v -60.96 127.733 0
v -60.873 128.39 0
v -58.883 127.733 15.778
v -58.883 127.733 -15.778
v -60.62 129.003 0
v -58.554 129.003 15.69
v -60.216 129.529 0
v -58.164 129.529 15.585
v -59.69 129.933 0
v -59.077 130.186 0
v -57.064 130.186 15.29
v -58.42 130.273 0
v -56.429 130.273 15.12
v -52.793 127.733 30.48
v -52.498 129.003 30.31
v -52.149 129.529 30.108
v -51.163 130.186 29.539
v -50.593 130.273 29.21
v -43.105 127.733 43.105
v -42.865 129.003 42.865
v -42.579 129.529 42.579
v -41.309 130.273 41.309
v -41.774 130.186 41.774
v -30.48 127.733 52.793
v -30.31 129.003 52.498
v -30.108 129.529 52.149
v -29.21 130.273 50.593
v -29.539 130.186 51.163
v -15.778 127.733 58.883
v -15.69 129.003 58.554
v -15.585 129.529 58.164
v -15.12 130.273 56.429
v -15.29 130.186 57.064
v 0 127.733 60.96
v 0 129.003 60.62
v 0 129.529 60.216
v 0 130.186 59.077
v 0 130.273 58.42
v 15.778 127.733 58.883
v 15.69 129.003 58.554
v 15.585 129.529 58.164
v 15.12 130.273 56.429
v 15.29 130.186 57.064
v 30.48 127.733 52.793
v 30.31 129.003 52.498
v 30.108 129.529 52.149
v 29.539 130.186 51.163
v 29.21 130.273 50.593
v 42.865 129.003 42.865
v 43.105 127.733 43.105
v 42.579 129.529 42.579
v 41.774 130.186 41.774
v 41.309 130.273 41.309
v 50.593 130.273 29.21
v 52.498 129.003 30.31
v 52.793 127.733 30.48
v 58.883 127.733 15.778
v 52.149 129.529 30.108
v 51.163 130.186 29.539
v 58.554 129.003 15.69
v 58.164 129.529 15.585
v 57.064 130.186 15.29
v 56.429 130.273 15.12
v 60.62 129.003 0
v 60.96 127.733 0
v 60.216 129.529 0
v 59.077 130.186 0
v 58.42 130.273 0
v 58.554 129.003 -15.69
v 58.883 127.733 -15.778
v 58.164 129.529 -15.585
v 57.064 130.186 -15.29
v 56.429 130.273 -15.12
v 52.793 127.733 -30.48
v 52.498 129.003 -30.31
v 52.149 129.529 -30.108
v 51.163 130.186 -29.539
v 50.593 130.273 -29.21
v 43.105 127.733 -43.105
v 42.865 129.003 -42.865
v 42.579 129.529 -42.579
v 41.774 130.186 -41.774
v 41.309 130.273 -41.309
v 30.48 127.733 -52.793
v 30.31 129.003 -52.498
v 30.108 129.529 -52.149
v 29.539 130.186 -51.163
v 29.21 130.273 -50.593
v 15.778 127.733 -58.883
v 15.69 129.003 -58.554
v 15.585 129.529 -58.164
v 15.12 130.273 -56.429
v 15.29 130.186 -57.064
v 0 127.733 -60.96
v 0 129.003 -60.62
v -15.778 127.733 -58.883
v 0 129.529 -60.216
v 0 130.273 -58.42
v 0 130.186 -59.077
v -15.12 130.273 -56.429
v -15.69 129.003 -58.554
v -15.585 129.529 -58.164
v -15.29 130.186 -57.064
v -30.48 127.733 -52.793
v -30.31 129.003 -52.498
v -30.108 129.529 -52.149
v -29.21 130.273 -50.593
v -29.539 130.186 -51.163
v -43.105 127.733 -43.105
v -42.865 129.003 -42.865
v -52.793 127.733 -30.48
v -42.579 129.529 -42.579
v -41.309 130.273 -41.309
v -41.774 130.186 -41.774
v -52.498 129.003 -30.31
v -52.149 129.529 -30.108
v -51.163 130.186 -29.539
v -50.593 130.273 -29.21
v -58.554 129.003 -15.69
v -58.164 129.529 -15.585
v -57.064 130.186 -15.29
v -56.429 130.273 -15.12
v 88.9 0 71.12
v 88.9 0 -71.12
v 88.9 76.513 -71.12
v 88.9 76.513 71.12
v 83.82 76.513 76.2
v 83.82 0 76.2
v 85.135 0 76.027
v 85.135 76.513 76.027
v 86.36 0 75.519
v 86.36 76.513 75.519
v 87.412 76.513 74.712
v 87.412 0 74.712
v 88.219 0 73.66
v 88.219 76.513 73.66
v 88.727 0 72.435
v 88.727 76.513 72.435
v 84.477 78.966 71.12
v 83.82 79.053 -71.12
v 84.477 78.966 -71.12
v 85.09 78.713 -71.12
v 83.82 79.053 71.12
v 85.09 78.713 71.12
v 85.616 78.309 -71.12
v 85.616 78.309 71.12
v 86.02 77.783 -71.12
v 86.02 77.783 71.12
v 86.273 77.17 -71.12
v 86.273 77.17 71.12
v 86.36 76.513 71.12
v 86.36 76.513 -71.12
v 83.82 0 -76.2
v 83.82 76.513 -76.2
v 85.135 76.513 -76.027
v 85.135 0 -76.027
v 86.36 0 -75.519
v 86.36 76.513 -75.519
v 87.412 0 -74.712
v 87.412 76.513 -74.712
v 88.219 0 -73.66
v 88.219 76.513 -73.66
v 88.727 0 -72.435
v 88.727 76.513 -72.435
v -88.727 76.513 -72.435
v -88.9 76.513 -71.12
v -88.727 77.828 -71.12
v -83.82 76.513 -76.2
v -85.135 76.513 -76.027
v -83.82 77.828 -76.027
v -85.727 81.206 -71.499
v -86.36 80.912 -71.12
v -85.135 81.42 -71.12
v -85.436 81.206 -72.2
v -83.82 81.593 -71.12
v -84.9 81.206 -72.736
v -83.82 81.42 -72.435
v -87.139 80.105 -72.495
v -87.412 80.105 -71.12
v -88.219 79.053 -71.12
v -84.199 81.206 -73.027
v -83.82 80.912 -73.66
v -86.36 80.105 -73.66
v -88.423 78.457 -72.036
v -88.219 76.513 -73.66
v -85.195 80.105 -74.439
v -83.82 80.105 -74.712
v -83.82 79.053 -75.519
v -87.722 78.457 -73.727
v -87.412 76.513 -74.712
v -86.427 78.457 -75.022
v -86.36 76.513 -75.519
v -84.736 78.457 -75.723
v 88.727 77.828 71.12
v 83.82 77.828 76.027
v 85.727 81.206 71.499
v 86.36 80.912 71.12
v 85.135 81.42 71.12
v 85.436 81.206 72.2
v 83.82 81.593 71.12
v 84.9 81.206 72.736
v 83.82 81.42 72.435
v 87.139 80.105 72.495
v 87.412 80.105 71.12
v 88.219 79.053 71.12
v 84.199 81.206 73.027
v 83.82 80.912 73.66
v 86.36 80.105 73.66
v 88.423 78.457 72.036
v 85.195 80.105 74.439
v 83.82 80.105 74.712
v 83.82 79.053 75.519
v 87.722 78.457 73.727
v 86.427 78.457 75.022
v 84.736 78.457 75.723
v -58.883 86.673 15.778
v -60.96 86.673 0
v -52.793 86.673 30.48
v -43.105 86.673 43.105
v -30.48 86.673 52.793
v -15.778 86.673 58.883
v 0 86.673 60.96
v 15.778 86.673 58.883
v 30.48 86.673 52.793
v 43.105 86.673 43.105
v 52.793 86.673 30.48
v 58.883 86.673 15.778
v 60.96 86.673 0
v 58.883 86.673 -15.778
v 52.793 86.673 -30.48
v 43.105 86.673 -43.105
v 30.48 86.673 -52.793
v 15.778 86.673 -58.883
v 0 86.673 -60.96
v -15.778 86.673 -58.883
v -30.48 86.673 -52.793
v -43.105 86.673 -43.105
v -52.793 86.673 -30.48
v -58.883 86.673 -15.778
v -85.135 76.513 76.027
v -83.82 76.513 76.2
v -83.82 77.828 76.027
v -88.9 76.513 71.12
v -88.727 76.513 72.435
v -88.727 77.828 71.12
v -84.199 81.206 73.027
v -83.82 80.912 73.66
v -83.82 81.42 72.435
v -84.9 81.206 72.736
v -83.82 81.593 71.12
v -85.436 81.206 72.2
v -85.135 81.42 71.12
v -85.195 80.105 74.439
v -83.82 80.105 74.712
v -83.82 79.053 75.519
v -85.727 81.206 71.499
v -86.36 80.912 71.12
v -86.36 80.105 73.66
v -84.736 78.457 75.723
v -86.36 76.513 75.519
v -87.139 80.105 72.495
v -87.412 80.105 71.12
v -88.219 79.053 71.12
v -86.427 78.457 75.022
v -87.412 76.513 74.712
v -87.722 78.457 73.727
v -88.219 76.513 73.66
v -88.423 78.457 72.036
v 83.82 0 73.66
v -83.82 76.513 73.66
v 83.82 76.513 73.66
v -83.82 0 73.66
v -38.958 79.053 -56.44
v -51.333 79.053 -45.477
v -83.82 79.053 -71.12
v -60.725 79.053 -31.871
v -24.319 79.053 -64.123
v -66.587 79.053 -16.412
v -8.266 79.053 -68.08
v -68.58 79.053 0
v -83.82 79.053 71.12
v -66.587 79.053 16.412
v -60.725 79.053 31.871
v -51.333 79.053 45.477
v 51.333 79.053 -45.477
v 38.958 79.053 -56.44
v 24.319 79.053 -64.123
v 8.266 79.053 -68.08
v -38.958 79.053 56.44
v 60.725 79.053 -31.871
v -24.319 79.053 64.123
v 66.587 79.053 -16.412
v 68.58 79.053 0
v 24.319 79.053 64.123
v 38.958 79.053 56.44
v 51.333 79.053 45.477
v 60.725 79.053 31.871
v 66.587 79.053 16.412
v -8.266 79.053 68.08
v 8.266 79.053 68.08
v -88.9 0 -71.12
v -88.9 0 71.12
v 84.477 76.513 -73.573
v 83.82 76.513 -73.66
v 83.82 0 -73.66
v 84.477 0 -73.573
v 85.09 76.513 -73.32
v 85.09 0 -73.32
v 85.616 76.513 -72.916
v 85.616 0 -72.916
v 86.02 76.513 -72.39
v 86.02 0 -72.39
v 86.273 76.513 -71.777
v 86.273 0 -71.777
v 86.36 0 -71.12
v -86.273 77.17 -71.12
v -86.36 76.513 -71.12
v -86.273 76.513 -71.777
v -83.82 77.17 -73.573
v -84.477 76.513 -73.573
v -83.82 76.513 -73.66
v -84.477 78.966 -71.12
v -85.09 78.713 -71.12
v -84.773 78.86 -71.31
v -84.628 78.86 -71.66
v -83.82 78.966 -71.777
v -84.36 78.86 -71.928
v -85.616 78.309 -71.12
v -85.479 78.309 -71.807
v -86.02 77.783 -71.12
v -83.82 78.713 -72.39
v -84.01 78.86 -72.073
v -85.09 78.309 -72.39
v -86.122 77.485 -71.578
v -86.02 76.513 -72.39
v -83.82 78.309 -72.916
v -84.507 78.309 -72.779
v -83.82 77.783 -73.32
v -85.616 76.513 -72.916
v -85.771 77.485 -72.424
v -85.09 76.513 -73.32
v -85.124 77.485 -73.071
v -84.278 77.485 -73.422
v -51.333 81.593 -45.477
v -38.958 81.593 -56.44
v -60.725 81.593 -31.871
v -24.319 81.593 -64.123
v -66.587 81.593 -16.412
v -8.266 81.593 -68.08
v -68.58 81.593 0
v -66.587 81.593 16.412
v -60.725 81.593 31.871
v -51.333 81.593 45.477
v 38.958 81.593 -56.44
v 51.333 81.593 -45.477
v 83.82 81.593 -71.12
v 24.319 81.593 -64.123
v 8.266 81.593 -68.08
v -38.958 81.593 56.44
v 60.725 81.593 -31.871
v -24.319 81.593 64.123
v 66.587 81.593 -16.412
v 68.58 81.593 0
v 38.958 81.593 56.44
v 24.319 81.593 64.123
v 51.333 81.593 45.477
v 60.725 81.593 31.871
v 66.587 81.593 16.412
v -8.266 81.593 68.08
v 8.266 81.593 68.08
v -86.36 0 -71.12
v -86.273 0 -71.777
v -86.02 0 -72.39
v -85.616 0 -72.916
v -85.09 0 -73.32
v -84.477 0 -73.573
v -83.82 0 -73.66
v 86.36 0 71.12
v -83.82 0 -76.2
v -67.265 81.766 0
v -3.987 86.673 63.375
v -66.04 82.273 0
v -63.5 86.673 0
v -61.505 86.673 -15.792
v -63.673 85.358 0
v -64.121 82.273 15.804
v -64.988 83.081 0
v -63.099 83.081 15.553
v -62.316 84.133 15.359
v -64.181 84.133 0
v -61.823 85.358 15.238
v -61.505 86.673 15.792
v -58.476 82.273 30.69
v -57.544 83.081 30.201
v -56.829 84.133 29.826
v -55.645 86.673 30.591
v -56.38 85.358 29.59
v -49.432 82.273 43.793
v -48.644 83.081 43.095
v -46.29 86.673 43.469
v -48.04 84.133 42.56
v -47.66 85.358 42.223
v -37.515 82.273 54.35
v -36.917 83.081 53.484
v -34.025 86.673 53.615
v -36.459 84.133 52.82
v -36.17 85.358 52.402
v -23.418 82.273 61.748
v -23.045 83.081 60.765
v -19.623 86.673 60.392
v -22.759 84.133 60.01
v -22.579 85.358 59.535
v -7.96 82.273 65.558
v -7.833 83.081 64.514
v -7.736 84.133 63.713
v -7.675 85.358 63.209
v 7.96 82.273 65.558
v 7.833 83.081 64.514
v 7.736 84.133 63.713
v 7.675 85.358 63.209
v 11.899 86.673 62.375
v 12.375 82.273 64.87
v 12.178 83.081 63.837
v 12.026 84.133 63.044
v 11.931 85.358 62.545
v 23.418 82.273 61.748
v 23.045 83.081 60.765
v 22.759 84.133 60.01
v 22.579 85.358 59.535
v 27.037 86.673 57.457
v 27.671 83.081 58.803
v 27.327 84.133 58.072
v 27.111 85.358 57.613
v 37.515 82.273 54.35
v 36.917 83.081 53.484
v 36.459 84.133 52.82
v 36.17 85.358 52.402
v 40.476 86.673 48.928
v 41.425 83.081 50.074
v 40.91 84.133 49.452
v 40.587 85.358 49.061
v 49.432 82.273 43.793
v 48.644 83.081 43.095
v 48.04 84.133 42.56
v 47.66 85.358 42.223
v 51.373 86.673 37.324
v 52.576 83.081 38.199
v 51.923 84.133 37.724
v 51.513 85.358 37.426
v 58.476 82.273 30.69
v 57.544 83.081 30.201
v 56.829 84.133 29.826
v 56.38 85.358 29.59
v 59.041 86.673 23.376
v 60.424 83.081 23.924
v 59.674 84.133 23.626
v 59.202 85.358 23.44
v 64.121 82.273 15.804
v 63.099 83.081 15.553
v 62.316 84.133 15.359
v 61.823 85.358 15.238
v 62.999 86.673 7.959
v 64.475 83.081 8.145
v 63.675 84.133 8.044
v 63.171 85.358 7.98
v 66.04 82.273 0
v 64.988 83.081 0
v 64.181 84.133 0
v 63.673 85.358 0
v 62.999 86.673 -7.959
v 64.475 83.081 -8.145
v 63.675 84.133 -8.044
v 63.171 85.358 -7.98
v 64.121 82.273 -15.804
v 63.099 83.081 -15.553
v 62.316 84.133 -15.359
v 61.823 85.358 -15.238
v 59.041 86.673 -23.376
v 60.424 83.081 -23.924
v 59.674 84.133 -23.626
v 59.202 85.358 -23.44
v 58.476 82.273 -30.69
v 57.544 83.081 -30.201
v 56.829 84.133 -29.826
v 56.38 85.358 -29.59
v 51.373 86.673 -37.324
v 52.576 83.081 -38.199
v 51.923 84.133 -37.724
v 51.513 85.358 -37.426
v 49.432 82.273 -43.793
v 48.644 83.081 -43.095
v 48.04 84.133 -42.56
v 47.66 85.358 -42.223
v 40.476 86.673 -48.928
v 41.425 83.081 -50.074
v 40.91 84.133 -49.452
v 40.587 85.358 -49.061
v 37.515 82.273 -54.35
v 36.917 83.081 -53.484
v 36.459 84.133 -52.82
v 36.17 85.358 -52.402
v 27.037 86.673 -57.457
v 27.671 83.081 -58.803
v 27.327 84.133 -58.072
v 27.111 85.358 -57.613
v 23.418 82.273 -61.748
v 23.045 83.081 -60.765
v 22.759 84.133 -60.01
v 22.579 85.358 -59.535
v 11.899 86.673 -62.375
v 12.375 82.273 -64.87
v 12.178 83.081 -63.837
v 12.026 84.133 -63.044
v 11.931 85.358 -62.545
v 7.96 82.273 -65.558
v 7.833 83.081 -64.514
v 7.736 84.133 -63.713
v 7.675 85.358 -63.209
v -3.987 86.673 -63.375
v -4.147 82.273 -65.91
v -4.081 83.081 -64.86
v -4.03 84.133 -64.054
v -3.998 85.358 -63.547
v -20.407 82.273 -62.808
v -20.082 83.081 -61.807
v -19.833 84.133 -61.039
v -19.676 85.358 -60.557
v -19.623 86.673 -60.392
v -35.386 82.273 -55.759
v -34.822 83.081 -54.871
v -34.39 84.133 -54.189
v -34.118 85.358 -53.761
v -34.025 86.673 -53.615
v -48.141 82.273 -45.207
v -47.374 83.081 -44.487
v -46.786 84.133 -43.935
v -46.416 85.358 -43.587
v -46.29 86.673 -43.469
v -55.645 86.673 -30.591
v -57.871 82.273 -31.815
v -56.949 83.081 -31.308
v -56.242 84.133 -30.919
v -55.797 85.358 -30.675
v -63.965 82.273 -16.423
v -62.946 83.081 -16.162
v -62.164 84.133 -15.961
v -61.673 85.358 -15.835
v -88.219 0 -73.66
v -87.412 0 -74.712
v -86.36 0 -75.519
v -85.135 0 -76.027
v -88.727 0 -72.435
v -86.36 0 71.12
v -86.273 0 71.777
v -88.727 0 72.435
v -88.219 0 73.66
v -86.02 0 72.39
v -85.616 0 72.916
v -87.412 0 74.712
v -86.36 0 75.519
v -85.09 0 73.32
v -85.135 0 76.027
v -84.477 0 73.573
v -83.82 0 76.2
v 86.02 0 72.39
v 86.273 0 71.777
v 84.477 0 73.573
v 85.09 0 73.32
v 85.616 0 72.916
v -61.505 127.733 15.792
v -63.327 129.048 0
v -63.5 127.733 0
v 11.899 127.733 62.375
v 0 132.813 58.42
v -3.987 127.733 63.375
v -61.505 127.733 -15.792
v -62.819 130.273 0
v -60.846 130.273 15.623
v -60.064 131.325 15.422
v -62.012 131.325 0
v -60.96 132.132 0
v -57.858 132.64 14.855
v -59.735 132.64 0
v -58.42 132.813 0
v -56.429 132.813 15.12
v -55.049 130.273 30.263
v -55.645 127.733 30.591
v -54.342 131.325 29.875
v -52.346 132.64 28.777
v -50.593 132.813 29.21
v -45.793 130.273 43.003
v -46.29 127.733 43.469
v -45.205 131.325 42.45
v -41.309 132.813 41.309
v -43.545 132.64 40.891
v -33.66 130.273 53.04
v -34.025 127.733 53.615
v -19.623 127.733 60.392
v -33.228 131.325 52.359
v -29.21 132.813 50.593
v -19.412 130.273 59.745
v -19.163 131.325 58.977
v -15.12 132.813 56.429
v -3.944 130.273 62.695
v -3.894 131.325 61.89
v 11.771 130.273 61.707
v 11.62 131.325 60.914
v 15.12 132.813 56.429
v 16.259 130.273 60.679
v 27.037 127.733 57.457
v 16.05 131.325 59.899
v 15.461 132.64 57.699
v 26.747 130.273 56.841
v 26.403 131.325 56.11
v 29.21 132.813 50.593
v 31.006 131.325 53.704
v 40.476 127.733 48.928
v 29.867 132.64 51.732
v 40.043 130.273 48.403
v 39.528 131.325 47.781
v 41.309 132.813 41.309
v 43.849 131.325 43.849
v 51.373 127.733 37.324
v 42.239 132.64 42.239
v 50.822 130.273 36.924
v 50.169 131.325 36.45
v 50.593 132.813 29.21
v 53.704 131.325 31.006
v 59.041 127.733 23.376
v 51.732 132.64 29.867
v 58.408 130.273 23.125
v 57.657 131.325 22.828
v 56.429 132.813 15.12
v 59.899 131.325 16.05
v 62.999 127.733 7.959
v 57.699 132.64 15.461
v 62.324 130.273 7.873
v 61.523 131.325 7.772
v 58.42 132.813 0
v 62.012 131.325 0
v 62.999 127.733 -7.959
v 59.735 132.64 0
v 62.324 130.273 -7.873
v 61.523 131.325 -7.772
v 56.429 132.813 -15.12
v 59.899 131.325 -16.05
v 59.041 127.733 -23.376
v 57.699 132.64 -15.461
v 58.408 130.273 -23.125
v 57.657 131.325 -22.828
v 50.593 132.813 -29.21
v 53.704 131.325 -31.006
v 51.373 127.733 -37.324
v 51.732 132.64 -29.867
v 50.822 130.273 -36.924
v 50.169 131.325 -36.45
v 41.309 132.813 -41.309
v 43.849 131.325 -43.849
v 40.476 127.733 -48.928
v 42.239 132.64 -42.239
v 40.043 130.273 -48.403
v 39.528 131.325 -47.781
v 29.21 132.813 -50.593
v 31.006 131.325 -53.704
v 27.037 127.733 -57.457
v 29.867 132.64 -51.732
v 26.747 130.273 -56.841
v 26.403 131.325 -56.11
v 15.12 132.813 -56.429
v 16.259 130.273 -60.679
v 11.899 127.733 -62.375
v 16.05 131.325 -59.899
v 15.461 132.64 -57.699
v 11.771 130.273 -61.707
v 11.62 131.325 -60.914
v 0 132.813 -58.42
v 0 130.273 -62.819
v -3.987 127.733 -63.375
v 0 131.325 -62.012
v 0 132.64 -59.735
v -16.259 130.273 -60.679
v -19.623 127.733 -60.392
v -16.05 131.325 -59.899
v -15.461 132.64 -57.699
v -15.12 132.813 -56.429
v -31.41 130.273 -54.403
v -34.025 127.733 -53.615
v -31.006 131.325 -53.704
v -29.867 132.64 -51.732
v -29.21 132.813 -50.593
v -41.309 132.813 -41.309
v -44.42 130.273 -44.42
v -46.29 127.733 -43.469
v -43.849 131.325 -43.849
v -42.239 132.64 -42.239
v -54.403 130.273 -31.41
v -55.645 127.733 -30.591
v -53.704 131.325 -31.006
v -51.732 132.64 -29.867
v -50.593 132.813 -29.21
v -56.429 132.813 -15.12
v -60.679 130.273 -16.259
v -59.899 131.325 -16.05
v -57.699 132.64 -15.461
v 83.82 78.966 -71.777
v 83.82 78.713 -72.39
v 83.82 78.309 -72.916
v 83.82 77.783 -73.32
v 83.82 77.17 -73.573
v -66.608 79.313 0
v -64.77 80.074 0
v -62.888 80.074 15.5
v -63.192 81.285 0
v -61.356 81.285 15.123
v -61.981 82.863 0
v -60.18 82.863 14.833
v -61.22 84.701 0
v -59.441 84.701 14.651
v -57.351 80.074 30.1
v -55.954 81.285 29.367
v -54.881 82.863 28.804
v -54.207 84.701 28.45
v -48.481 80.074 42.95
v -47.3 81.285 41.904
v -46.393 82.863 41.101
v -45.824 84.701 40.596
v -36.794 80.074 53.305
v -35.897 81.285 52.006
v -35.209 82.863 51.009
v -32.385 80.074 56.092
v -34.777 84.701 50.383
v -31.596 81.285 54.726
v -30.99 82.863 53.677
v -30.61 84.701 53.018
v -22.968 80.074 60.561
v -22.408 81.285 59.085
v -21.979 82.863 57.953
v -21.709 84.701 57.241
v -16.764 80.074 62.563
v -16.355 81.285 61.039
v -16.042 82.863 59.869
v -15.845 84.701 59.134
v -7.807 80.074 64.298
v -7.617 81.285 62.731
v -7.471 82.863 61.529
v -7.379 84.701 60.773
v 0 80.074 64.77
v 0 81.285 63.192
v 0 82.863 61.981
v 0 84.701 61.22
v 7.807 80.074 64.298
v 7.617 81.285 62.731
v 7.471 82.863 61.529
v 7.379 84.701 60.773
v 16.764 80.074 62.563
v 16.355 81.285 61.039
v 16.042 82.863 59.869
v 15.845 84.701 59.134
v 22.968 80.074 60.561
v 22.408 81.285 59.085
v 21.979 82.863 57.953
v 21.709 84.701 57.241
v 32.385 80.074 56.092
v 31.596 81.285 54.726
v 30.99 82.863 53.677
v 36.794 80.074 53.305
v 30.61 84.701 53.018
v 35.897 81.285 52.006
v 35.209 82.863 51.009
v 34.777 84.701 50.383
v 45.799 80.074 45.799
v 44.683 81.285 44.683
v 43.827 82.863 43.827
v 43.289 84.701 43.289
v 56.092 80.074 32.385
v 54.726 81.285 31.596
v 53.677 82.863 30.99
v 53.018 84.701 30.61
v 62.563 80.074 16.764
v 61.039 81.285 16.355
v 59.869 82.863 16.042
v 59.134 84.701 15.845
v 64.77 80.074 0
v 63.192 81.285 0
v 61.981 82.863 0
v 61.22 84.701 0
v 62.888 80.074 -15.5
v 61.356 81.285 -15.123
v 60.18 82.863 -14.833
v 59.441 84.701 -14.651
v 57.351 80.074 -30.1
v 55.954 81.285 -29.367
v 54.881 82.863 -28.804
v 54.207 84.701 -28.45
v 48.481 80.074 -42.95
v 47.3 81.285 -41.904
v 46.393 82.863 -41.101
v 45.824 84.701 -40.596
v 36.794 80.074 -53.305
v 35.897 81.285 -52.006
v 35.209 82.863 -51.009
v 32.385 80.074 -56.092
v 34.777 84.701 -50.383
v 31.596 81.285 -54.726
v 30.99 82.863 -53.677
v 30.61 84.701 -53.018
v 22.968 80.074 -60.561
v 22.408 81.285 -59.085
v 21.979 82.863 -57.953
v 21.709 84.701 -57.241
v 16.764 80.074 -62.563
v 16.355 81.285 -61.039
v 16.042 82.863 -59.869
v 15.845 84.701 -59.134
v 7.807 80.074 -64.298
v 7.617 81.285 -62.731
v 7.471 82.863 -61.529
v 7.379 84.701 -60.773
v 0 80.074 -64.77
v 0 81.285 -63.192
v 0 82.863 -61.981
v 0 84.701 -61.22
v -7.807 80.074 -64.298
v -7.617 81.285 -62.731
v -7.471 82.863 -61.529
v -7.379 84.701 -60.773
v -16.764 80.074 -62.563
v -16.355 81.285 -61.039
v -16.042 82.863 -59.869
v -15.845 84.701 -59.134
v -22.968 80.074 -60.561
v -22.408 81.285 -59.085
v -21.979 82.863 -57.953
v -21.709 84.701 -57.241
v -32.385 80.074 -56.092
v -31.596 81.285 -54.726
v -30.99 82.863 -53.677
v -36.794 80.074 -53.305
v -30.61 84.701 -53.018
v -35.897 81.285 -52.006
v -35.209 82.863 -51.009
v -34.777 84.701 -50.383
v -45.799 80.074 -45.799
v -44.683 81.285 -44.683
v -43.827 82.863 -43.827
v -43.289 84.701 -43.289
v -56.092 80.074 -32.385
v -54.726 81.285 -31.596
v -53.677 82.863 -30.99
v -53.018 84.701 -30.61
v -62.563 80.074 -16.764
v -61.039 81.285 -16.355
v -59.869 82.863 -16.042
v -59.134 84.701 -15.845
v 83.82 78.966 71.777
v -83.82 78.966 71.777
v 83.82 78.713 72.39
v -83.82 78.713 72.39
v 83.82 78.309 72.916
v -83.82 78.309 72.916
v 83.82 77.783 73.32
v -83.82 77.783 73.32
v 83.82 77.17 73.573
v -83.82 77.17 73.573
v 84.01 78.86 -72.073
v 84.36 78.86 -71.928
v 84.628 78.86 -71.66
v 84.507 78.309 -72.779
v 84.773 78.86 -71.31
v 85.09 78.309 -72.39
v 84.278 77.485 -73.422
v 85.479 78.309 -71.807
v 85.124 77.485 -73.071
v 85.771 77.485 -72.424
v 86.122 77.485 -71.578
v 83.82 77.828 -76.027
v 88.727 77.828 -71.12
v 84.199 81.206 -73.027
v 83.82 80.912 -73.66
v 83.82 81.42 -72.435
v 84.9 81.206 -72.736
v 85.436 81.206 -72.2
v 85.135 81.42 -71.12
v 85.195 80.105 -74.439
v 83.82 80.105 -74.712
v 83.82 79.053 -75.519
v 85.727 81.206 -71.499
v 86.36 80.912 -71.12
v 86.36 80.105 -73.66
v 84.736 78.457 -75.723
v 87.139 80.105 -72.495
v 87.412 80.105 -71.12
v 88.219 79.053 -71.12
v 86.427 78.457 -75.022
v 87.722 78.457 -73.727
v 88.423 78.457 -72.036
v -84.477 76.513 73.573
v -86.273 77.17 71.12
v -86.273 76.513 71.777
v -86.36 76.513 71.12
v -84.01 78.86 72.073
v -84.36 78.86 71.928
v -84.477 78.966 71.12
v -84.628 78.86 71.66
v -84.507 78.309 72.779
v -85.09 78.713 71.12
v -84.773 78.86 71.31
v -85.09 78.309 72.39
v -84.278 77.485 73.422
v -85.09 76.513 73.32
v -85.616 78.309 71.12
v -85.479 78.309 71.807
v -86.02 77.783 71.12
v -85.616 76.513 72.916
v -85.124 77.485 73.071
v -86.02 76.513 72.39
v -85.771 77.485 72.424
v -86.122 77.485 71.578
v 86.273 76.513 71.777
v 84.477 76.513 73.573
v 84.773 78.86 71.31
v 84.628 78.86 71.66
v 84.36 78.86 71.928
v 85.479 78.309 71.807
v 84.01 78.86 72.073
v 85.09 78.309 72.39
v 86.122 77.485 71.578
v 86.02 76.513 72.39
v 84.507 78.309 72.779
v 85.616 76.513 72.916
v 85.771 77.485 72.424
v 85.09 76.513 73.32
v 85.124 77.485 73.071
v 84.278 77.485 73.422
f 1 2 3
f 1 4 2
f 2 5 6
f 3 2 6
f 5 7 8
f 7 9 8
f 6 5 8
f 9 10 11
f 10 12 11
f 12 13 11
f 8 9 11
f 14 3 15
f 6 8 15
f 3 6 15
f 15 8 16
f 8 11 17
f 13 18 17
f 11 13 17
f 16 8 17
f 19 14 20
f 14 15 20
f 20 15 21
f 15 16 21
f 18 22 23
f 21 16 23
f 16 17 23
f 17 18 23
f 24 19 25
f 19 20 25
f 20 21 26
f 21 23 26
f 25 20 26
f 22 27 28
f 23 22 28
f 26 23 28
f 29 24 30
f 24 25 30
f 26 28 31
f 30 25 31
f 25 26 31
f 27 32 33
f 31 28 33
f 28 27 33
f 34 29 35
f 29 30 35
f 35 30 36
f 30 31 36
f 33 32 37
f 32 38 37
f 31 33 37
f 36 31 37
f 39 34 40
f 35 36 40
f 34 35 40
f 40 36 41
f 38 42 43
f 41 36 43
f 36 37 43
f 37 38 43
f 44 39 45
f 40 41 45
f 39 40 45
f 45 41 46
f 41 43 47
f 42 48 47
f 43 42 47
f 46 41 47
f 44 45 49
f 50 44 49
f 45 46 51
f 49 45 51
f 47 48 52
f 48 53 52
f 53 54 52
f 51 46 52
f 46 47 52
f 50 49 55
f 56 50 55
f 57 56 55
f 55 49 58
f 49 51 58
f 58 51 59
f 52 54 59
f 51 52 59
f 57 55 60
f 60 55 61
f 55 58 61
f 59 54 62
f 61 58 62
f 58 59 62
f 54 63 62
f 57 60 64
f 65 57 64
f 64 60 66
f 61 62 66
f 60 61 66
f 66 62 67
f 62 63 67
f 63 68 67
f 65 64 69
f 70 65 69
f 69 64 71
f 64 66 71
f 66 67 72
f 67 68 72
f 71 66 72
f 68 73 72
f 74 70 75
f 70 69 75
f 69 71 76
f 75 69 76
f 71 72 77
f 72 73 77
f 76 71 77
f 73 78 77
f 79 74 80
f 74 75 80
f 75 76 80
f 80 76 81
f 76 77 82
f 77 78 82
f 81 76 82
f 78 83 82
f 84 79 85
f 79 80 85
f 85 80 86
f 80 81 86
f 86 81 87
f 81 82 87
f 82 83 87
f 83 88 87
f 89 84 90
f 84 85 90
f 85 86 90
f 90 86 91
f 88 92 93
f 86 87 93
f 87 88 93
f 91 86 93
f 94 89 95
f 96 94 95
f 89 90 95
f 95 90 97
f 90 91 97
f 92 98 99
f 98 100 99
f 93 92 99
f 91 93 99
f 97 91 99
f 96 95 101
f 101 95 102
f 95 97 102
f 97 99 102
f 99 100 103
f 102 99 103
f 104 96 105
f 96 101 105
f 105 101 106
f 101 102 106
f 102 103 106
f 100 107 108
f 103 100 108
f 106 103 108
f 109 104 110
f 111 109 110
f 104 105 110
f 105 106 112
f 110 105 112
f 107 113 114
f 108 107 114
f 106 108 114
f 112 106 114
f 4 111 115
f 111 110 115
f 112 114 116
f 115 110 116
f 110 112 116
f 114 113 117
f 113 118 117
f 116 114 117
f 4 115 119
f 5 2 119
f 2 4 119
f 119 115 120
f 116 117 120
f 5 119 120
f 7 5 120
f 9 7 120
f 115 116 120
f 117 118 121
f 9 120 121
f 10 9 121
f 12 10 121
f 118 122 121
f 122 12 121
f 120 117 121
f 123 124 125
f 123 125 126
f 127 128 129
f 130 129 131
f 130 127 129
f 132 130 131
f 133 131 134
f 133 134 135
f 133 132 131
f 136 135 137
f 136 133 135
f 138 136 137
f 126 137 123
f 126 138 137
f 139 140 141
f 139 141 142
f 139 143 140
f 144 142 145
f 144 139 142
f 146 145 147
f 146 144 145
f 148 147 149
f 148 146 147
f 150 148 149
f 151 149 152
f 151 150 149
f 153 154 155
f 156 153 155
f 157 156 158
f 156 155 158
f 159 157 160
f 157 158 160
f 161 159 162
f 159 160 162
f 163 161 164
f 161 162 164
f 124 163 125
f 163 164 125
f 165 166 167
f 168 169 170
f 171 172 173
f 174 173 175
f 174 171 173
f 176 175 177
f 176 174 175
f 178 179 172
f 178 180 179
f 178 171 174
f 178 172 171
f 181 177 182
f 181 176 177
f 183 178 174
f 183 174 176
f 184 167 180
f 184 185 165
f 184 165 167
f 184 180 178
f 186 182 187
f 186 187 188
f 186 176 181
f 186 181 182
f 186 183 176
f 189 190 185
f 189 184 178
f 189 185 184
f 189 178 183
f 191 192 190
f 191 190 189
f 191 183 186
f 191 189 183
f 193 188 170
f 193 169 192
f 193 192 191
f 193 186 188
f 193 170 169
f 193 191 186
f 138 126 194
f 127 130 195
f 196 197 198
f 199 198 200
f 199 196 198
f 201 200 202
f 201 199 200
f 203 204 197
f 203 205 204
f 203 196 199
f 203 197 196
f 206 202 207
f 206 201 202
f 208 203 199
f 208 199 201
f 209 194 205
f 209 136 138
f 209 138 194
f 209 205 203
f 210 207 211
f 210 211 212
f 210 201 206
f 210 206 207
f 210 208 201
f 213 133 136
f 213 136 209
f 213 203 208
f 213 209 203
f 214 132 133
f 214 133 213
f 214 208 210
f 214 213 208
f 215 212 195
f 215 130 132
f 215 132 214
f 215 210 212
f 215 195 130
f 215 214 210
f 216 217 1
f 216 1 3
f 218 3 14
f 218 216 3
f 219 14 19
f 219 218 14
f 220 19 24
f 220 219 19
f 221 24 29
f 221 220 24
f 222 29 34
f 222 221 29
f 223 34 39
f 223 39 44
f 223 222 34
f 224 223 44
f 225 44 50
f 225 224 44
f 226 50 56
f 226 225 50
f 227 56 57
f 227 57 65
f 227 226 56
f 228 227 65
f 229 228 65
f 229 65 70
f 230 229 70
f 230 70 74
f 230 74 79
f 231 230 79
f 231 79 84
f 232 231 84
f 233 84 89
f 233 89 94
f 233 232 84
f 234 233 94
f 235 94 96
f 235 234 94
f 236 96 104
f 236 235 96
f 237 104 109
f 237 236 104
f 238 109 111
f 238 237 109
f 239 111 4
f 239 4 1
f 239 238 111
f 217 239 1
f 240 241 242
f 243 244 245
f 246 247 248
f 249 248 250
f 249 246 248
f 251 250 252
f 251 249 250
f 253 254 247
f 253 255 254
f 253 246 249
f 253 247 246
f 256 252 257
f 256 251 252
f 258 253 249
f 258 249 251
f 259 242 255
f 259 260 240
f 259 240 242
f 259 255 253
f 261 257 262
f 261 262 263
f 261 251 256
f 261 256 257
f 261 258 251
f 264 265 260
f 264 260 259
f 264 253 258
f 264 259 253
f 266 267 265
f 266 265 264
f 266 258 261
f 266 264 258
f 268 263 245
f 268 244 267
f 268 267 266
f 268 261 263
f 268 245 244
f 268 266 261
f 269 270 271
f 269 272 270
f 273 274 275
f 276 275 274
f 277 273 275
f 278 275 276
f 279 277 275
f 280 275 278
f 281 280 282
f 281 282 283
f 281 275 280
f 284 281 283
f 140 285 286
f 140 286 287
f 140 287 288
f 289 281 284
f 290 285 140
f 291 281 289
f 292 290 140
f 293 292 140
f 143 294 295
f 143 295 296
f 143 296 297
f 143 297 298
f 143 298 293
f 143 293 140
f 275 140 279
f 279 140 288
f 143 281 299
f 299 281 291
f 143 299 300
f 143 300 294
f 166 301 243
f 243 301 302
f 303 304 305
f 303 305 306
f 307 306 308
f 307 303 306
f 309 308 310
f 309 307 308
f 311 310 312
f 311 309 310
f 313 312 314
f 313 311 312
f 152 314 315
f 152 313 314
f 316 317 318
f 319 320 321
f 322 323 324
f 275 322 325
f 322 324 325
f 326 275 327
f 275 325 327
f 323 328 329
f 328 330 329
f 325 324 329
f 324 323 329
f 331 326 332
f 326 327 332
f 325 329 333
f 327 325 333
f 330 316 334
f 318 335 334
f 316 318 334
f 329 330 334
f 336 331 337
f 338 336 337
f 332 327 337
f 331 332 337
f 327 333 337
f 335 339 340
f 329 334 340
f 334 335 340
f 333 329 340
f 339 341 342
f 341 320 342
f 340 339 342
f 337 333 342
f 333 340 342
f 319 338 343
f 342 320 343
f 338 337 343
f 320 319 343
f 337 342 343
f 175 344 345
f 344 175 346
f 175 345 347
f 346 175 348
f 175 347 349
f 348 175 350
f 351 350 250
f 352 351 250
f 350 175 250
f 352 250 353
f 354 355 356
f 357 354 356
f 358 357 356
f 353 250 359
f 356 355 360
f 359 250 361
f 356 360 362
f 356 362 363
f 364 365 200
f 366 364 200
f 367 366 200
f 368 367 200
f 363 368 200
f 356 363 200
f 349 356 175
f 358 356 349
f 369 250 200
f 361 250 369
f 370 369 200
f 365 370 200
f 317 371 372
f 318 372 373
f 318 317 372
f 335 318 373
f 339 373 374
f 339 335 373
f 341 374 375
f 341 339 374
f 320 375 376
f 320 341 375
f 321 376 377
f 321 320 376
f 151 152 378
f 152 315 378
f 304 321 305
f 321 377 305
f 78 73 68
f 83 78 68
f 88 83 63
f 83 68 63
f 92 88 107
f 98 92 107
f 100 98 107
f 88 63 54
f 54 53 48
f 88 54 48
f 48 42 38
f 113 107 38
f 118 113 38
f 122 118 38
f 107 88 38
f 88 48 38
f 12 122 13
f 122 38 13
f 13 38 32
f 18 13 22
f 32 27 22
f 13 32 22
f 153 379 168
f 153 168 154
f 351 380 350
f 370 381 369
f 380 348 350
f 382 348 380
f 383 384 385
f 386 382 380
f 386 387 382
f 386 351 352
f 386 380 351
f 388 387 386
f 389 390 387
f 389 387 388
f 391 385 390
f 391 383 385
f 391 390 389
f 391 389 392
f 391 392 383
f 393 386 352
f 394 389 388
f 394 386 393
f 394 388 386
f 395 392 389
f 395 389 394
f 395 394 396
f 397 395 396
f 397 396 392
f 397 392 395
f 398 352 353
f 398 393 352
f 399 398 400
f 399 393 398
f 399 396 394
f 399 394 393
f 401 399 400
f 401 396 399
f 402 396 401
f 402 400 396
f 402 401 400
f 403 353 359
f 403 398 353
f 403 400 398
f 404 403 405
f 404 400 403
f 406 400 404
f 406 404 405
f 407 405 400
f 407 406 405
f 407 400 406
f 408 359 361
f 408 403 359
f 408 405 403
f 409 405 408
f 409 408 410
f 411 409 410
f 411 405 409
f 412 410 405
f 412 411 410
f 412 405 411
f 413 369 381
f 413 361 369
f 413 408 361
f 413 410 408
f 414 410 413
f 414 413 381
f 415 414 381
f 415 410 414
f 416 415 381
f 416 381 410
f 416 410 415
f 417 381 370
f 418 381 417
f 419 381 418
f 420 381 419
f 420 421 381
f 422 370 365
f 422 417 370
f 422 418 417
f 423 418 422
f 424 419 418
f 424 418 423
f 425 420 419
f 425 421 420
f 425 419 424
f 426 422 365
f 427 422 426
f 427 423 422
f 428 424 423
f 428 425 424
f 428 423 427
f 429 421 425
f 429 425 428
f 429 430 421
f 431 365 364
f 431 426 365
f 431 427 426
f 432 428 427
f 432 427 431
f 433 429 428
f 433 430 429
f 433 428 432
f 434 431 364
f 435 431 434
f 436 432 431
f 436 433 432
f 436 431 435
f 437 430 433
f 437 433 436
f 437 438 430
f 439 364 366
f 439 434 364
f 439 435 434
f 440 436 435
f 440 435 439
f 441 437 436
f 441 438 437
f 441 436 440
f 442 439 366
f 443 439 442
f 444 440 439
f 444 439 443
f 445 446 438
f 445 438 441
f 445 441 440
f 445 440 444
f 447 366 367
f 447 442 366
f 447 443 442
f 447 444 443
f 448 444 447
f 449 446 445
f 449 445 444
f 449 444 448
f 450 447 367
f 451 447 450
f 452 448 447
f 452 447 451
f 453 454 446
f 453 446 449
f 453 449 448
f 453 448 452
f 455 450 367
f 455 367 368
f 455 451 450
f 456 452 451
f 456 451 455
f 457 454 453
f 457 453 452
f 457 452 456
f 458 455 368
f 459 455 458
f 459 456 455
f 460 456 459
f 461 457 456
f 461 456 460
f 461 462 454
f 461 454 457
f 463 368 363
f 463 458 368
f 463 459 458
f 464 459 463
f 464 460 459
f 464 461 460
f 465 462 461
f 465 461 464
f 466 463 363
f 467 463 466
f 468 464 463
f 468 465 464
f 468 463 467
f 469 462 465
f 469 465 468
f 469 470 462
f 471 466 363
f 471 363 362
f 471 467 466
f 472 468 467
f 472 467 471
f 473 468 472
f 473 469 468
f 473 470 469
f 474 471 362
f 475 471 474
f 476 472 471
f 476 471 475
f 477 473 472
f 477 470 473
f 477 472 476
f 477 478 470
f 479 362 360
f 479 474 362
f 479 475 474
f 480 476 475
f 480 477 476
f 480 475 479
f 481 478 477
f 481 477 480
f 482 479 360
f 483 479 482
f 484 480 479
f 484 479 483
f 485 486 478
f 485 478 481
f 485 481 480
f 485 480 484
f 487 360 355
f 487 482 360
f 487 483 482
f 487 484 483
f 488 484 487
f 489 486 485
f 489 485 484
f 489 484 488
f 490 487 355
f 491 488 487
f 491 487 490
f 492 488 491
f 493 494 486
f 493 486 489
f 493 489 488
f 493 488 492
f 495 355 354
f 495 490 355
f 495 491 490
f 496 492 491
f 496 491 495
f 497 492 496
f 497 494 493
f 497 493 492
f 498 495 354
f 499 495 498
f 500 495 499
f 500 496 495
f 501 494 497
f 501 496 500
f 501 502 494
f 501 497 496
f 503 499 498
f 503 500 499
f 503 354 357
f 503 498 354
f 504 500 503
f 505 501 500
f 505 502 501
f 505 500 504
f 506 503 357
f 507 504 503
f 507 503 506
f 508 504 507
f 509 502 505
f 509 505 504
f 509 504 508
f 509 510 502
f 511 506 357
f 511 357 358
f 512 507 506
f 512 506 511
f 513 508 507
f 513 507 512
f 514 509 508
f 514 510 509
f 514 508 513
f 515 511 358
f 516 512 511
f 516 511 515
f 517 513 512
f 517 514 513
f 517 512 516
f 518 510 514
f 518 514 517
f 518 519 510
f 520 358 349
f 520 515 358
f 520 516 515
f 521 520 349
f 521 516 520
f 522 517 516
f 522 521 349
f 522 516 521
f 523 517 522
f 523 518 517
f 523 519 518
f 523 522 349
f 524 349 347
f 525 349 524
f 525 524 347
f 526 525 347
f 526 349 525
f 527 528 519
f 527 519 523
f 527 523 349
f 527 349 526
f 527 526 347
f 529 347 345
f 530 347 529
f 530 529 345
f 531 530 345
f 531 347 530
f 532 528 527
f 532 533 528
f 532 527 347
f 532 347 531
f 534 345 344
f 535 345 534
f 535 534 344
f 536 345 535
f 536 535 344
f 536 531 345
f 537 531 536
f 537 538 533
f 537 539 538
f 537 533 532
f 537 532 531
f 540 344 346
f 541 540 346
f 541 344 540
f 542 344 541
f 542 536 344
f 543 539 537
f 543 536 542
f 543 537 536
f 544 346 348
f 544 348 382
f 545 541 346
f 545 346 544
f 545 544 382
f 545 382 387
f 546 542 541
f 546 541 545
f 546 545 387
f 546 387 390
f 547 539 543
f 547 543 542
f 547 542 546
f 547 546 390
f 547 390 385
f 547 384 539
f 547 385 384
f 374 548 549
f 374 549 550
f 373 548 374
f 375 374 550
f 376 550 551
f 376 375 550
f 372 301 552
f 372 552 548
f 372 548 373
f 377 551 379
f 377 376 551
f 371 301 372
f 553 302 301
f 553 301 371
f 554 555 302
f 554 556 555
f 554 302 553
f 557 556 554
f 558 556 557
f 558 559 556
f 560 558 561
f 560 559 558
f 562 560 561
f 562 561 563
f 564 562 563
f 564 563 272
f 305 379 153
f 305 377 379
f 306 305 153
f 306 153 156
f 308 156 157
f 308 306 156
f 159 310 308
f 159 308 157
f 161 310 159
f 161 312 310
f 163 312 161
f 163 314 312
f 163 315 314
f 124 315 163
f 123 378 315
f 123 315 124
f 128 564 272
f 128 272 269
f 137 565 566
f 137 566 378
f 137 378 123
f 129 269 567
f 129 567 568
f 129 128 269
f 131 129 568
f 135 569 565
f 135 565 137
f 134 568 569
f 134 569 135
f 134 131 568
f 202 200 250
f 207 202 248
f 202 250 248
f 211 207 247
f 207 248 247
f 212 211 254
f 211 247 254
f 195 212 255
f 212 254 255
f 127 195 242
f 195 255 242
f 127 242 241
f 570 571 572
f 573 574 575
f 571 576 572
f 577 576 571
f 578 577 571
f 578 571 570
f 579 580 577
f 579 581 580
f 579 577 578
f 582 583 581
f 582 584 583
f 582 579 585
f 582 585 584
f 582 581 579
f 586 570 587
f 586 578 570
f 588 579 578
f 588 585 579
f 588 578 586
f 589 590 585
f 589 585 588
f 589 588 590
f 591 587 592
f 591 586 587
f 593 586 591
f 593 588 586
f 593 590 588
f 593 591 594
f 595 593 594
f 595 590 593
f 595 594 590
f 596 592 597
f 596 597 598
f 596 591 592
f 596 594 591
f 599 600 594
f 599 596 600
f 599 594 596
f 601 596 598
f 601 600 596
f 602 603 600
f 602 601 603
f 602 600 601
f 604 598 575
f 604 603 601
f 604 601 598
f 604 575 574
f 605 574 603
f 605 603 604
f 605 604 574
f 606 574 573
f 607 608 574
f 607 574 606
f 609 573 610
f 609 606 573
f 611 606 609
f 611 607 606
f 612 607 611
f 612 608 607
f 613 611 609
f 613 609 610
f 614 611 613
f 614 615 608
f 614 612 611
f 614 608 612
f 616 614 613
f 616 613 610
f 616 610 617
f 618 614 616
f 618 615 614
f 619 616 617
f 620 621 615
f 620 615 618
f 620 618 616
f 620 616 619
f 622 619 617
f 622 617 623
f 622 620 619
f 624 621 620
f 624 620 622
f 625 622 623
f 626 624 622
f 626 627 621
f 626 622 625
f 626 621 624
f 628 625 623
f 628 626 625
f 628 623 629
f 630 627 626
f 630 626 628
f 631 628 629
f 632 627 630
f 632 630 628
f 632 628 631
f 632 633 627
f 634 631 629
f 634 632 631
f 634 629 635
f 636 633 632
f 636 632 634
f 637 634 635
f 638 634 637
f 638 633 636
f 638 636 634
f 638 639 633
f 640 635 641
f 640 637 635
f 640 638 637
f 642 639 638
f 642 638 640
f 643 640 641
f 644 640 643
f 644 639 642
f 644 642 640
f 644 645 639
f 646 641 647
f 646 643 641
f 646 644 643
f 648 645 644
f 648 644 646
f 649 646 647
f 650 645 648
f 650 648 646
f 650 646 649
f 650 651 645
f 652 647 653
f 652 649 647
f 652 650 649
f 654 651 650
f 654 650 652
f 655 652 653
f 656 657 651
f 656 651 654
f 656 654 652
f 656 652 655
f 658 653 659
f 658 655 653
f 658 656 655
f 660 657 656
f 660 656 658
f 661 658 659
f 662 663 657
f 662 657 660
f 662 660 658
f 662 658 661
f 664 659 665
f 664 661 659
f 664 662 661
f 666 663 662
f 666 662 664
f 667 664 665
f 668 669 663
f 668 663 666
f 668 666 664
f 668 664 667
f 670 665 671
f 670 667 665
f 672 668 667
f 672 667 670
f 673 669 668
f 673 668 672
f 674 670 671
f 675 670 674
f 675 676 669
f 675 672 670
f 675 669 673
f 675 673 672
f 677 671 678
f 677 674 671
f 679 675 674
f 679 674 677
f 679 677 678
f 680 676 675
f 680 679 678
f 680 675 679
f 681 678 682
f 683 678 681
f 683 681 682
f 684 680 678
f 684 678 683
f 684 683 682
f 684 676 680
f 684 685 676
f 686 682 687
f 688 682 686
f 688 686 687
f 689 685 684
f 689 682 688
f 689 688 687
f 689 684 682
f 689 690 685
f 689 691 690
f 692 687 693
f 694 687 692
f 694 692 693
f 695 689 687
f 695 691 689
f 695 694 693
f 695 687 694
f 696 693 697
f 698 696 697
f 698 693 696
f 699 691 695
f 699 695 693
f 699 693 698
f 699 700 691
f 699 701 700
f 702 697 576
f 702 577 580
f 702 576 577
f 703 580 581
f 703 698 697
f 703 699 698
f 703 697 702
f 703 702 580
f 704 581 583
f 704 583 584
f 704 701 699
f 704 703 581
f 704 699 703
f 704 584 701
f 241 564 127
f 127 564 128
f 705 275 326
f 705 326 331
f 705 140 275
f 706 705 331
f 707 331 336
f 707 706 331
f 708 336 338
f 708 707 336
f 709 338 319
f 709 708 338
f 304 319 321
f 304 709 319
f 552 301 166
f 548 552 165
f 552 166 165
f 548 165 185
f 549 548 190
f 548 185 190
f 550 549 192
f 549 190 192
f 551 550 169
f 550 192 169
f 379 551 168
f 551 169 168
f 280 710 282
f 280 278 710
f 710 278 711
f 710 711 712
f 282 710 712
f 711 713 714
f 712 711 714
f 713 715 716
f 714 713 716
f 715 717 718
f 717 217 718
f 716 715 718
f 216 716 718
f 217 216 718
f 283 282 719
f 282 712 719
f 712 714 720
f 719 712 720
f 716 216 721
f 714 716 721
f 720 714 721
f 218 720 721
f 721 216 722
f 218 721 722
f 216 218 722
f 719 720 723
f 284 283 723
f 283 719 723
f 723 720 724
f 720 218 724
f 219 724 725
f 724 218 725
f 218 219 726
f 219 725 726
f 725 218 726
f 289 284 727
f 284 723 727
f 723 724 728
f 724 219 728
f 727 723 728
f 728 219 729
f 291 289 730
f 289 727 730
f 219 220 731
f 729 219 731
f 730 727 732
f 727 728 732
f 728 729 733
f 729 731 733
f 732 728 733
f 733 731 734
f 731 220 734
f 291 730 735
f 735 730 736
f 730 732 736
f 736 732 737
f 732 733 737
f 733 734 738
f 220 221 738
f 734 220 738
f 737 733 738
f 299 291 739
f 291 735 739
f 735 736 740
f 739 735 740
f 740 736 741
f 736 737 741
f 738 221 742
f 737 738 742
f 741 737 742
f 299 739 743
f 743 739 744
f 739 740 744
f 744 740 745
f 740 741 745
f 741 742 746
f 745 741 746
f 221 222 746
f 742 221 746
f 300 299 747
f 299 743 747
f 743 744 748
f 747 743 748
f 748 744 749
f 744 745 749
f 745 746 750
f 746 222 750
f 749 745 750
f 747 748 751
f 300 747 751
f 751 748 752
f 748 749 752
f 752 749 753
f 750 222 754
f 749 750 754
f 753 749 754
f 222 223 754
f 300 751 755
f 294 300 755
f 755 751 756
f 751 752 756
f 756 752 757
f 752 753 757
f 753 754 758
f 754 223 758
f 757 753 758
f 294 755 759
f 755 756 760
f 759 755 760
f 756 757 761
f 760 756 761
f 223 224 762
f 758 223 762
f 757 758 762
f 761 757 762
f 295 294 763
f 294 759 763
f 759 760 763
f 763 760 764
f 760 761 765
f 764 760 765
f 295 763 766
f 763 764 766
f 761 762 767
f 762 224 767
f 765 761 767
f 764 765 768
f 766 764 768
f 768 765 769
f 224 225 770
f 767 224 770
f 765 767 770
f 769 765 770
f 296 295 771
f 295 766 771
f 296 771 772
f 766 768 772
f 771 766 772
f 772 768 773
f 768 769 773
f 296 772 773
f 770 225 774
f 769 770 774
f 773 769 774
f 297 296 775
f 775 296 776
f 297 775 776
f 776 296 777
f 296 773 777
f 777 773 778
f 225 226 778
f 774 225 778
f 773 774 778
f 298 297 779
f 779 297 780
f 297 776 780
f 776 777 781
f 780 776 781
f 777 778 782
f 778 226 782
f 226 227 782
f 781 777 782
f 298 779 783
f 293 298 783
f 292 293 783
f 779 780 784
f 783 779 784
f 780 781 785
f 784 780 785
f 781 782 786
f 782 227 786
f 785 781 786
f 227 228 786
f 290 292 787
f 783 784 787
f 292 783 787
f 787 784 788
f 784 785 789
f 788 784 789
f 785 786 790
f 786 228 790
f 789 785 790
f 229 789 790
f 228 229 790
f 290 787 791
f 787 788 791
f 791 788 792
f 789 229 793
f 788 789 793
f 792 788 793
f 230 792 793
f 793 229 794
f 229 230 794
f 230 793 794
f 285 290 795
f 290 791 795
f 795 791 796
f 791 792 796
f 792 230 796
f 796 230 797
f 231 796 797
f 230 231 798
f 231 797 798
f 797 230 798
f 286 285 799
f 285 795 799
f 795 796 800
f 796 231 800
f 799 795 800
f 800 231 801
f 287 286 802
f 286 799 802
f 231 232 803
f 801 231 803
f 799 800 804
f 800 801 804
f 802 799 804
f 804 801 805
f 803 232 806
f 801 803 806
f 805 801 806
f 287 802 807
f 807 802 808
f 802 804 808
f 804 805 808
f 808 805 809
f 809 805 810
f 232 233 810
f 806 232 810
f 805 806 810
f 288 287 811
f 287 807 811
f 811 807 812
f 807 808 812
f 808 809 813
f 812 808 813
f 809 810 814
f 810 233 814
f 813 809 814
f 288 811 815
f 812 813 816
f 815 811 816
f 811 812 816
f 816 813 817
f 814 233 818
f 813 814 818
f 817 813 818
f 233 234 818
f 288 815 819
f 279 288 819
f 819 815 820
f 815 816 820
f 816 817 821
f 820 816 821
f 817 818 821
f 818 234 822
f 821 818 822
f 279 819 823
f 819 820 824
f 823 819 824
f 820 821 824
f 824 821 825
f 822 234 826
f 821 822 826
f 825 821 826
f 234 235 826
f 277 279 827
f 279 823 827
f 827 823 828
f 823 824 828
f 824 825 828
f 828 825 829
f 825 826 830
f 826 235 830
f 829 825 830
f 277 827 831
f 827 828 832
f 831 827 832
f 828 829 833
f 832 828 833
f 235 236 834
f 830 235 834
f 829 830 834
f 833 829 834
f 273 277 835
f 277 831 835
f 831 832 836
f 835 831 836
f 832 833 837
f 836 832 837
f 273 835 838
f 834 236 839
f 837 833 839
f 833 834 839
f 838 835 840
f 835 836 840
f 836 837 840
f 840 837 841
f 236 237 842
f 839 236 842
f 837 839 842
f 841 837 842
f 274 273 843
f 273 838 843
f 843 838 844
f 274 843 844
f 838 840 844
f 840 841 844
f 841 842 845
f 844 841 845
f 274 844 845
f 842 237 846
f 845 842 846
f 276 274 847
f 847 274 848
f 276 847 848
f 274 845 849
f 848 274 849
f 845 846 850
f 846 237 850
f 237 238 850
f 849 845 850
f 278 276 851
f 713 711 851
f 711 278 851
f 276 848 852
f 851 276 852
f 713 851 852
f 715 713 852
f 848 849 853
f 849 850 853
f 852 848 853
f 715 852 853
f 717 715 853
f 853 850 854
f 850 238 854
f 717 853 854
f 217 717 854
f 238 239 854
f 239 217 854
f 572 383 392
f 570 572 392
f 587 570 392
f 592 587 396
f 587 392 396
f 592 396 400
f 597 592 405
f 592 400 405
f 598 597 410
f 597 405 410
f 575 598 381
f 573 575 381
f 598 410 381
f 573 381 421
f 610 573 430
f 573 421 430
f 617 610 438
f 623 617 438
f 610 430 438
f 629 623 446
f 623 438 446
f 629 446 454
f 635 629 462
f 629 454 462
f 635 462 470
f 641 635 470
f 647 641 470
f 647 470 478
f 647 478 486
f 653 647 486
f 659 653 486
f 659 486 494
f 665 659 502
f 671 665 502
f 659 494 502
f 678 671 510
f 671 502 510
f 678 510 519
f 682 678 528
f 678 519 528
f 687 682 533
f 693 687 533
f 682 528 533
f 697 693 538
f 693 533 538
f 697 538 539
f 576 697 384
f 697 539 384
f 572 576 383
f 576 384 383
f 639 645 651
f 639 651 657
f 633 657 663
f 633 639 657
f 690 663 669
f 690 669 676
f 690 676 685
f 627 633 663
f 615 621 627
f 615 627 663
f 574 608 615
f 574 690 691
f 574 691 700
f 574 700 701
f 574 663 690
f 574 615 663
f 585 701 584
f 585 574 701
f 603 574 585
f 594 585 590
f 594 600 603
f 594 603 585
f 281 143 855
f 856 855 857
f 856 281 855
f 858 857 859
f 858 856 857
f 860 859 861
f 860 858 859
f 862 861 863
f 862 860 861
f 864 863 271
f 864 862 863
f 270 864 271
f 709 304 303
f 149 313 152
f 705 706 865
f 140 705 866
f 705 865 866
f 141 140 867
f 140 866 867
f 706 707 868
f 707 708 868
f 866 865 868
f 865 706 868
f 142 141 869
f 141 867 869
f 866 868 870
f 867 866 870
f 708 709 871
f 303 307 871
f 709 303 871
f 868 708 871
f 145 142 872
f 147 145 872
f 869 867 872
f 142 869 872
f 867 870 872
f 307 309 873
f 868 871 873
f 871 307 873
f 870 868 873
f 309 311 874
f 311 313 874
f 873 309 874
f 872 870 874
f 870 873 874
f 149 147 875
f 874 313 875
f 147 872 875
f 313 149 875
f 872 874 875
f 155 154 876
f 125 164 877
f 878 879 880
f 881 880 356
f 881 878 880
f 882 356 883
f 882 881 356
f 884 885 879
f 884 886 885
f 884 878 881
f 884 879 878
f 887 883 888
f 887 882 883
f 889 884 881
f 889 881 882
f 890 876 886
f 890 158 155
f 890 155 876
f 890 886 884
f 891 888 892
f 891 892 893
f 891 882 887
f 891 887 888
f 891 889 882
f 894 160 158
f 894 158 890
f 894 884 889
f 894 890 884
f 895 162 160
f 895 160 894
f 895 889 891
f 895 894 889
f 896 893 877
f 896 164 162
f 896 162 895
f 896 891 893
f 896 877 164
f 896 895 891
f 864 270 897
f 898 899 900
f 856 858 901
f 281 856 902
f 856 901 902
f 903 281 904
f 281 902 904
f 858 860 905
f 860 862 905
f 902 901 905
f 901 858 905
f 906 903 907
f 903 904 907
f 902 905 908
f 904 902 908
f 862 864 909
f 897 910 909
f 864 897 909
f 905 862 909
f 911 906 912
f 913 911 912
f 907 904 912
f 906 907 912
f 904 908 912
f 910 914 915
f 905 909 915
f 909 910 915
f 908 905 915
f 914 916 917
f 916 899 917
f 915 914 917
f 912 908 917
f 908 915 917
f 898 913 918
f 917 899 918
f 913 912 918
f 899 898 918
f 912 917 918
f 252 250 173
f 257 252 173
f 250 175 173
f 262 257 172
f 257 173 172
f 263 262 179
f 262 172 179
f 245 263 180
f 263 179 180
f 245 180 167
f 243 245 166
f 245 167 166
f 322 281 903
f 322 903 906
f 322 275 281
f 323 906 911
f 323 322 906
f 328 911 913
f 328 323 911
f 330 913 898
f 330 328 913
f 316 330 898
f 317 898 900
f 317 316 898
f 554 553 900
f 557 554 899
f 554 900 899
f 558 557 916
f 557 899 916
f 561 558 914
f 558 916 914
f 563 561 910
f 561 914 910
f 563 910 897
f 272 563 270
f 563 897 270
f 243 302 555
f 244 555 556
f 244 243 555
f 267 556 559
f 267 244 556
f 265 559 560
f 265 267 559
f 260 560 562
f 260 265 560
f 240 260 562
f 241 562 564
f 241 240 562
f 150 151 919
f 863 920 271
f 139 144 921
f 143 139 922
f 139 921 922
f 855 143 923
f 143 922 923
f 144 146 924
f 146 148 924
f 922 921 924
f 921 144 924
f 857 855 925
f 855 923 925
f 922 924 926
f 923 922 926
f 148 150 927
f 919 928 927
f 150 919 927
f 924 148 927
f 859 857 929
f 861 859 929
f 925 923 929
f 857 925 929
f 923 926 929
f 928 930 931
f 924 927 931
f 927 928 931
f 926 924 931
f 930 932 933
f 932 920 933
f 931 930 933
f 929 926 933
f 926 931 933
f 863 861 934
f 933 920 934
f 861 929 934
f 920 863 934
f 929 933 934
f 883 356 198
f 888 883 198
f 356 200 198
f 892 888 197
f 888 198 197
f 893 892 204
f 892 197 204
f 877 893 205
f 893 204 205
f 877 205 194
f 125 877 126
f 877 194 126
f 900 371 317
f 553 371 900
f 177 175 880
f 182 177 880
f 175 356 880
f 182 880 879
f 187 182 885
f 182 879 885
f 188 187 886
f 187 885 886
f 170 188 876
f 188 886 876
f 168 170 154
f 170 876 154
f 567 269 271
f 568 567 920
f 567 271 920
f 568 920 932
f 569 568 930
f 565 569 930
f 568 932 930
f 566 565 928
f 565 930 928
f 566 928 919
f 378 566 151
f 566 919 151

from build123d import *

# Parameters (mm, degrees)
F0_W     = 177.8
F0_H     = 152.4
F1_DEPTH = 81.59288
F2_R     = 63.5
F3_DEPTH = 51.22014
F4_R     = 5.08
F5_R     = 5.08
F6_T     = -2.54


with BuildPart() as f1:
    # F0 (on Front) → F1 (new body)
    with BuildSketch(Plane.XZ):
        Rectangle(F0_W, F0_H)
    extrude(amount=-F1_DEPTH)

    # F2 (on face) → F3 (join)
    with BuildSketch(Plane(origin=(0, 81.59288, 0), x_dir=(-1, 0, 0), z_dir=(0, 1, 0))):
        Circle(F2_R)
    extrude(amount=F3_DEPTH)

    # F4
    f4_edges = [f1.edges().sort_by_distance(p)[0] for p in [
        (63.5, 81.59288, 0),
        (63.5, 132.81302, 0),
        (-88.9, 40.79644, 76.2),
        (88.9, 40.79644, 76.2),
        (-88.9, 40.79644, -76.2),
        (88.9, 40.79644, -76.2),
    ]]
    fillet(f4_edges, radius=F4_R)

    # F5
    f5_edges = [f1.edges().sort_by_distance(p)[0] for p in [
        (0, 81.59288, -76.2),
    ]]
    fillet(f5_edges, radius=F5_R)

    # F6
    f6_openings = [f1.faces().sort_by_distance(p)[0] for p in [
        (0, 0, 0),
    ]]
    offset(amount=F6_T, openings=f6_openings)


solid = f1.part
